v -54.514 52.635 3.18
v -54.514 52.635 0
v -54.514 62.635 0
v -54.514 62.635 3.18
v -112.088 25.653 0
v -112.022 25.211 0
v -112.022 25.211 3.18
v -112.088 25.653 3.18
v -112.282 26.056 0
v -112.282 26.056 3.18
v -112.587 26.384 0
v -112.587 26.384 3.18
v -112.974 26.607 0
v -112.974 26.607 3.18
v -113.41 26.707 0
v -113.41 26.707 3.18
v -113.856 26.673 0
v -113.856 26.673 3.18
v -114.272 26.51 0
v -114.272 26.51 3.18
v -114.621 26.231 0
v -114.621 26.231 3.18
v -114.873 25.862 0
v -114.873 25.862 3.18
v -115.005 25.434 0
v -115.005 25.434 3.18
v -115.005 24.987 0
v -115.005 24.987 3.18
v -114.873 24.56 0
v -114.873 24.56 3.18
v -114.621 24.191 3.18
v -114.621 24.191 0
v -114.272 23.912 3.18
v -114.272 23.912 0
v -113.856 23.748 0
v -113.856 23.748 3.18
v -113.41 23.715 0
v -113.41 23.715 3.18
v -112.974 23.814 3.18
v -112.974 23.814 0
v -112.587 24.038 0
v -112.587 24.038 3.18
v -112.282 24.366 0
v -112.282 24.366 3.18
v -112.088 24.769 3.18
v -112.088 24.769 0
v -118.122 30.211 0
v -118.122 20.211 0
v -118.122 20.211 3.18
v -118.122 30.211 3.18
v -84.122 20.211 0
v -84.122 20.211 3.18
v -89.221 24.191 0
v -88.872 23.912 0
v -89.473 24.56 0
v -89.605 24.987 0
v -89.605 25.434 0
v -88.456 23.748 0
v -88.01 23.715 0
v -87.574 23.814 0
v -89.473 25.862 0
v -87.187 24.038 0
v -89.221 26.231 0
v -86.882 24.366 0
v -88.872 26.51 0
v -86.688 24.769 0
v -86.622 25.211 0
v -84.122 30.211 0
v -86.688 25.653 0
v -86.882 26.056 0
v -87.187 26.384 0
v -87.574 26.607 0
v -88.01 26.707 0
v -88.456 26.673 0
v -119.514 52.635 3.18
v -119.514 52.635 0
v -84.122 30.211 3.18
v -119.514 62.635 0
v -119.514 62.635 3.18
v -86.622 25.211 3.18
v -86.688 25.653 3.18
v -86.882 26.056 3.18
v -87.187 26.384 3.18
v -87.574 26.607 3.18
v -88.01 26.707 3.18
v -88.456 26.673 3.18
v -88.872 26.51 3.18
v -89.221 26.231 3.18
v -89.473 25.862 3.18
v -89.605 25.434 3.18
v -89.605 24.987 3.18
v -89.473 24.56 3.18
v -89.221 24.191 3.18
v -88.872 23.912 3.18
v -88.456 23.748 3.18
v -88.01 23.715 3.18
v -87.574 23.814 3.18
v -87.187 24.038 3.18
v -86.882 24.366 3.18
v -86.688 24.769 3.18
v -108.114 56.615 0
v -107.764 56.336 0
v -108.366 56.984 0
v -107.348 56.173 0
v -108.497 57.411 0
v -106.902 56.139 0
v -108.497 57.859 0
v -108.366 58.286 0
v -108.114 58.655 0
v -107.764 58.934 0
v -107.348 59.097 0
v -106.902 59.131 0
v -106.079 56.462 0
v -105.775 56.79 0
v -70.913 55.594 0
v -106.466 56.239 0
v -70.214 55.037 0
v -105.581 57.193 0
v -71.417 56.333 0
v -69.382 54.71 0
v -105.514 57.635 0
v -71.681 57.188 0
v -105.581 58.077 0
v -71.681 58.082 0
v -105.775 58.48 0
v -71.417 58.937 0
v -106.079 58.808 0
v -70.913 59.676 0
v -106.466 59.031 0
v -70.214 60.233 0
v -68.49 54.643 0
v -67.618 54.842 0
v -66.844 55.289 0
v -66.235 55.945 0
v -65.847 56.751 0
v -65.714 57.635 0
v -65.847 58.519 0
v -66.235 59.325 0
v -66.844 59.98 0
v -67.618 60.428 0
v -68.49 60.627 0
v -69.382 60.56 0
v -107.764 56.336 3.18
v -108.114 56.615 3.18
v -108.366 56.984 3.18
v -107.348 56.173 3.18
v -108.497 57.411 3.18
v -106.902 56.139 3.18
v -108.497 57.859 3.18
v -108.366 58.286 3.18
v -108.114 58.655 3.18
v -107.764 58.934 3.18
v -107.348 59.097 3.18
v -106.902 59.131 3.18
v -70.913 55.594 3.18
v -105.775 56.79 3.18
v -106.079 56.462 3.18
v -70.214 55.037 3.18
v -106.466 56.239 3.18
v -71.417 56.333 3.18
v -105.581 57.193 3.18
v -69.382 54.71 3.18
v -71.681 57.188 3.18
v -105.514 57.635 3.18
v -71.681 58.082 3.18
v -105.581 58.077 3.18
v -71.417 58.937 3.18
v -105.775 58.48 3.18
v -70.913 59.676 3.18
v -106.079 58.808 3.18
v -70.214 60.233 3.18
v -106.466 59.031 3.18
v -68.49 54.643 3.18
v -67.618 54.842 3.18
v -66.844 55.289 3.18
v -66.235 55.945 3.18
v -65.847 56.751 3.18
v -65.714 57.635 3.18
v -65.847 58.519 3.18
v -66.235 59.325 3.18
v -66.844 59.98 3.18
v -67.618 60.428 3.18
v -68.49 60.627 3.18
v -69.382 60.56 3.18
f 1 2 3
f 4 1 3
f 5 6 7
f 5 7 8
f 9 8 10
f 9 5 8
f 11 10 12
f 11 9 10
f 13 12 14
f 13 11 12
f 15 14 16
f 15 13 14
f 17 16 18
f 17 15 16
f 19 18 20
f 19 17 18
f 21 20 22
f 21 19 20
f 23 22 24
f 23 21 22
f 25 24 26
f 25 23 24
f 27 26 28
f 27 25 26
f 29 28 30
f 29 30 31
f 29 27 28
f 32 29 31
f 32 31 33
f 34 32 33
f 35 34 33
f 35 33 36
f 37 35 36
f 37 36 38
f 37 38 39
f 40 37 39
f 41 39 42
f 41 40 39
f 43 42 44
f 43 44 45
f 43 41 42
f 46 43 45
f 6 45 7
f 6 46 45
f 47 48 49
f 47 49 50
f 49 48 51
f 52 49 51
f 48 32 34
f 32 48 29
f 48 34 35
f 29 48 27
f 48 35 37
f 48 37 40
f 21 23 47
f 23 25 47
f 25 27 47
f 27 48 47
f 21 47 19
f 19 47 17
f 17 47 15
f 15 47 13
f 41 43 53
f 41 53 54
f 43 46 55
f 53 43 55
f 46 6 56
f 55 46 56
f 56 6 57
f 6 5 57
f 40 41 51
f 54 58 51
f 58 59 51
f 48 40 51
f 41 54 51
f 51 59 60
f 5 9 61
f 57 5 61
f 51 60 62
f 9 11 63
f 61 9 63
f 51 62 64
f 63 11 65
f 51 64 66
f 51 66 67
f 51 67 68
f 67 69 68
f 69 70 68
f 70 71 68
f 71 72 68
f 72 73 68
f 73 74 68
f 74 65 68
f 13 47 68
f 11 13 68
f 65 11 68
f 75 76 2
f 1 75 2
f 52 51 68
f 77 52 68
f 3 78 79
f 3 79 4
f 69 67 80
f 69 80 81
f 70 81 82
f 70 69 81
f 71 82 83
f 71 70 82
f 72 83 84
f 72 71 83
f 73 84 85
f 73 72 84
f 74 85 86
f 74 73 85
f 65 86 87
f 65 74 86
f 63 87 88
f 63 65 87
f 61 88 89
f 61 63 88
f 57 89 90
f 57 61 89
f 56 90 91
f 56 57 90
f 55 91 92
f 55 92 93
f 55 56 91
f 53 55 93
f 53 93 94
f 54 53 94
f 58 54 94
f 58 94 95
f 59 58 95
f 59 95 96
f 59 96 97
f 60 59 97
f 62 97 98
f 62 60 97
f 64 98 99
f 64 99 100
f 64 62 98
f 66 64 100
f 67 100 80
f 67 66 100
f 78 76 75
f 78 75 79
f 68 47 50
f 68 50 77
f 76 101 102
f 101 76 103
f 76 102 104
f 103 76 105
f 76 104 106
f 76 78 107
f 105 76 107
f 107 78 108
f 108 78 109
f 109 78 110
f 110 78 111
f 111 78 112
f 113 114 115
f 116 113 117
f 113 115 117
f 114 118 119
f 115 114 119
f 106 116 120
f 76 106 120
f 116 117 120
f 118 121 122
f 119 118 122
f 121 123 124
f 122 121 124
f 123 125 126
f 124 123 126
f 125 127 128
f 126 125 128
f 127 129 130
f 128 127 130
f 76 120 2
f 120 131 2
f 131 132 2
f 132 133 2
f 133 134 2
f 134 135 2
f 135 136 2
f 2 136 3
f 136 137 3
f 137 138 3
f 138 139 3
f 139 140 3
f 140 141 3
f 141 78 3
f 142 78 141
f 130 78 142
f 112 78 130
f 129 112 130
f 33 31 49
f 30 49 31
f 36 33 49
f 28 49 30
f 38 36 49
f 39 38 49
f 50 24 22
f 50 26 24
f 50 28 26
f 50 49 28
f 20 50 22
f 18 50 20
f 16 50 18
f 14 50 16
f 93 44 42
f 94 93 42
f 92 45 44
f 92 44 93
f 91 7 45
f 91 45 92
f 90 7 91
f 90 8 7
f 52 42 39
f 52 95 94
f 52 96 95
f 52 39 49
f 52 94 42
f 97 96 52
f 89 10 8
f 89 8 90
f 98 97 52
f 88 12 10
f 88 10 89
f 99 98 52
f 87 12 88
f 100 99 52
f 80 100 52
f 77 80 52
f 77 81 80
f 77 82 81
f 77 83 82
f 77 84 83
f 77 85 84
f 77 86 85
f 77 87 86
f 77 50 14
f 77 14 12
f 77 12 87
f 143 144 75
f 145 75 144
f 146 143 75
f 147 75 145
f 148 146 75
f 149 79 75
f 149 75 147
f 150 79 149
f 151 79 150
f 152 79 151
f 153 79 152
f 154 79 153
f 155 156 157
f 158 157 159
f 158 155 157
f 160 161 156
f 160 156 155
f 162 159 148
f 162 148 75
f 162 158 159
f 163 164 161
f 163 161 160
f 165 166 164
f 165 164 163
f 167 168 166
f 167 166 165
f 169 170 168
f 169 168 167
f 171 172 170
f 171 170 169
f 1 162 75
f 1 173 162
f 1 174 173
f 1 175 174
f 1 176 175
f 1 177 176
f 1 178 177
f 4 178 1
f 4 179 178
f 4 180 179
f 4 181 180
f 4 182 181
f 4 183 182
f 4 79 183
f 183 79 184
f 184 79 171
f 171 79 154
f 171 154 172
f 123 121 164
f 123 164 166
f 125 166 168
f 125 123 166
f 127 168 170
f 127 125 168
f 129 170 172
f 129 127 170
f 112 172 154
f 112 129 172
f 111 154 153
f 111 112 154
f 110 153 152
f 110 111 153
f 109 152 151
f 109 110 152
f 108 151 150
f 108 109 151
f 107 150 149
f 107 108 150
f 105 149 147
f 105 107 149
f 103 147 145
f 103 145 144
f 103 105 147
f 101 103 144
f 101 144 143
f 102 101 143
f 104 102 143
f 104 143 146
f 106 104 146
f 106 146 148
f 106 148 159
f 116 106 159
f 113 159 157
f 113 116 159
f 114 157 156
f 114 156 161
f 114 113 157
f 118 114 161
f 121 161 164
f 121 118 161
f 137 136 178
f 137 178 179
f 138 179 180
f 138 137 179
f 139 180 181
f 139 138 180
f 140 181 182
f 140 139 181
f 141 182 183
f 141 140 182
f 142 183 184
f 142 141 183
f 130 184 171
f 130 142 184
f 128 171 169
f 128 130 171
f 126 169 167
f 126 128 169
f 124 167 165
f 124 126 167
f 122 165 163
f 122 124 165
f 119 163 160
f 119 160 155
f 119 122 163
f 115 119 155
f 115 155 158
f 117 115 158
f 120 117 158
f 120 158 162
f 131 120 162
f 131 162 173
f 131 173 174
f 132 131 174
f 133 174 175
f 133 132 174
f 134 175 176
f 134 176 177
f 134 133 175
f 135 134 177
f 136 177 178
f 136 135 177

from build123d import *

# Parameters (mm, degrees)
F0_W     = 65
F0_H     = 10
F0_R     = 1.5
F0_R_2   = 3
F0_W_2   = 34
F1_DEPTH = 3.18


with BuildPart() as f1:
    # F0 (on Top) → F1 (new body)
    with BuildSketch(Plane.XY):
        with Locations((-87.014096, 57.634989)):
            Rectangle(F0_W, F0_H)
        with Locations((-107.014096, 57.634989)):
            Circle(F0_R, mode=Mode.SUBTRACT)
        with Locations((-68.714096, 57.634989)):
            Circle(F0_R_2, mode=Mode.SUBTRACT)
        with Locations((-101.121743, 25.210787)):
            Rectangle(F0_W_2, F0_H)
        with Locations((-113.521743, 25.210787)):
            Circle(F0_R, mode=Mode.SUBTRACT)
        with Locations((-88.121743, 25.210787)):
            Circle(F0_R, mode=Mode.SUBTRACT)
    extrude(amount=F1_DEPTH)


solid = f1.part
